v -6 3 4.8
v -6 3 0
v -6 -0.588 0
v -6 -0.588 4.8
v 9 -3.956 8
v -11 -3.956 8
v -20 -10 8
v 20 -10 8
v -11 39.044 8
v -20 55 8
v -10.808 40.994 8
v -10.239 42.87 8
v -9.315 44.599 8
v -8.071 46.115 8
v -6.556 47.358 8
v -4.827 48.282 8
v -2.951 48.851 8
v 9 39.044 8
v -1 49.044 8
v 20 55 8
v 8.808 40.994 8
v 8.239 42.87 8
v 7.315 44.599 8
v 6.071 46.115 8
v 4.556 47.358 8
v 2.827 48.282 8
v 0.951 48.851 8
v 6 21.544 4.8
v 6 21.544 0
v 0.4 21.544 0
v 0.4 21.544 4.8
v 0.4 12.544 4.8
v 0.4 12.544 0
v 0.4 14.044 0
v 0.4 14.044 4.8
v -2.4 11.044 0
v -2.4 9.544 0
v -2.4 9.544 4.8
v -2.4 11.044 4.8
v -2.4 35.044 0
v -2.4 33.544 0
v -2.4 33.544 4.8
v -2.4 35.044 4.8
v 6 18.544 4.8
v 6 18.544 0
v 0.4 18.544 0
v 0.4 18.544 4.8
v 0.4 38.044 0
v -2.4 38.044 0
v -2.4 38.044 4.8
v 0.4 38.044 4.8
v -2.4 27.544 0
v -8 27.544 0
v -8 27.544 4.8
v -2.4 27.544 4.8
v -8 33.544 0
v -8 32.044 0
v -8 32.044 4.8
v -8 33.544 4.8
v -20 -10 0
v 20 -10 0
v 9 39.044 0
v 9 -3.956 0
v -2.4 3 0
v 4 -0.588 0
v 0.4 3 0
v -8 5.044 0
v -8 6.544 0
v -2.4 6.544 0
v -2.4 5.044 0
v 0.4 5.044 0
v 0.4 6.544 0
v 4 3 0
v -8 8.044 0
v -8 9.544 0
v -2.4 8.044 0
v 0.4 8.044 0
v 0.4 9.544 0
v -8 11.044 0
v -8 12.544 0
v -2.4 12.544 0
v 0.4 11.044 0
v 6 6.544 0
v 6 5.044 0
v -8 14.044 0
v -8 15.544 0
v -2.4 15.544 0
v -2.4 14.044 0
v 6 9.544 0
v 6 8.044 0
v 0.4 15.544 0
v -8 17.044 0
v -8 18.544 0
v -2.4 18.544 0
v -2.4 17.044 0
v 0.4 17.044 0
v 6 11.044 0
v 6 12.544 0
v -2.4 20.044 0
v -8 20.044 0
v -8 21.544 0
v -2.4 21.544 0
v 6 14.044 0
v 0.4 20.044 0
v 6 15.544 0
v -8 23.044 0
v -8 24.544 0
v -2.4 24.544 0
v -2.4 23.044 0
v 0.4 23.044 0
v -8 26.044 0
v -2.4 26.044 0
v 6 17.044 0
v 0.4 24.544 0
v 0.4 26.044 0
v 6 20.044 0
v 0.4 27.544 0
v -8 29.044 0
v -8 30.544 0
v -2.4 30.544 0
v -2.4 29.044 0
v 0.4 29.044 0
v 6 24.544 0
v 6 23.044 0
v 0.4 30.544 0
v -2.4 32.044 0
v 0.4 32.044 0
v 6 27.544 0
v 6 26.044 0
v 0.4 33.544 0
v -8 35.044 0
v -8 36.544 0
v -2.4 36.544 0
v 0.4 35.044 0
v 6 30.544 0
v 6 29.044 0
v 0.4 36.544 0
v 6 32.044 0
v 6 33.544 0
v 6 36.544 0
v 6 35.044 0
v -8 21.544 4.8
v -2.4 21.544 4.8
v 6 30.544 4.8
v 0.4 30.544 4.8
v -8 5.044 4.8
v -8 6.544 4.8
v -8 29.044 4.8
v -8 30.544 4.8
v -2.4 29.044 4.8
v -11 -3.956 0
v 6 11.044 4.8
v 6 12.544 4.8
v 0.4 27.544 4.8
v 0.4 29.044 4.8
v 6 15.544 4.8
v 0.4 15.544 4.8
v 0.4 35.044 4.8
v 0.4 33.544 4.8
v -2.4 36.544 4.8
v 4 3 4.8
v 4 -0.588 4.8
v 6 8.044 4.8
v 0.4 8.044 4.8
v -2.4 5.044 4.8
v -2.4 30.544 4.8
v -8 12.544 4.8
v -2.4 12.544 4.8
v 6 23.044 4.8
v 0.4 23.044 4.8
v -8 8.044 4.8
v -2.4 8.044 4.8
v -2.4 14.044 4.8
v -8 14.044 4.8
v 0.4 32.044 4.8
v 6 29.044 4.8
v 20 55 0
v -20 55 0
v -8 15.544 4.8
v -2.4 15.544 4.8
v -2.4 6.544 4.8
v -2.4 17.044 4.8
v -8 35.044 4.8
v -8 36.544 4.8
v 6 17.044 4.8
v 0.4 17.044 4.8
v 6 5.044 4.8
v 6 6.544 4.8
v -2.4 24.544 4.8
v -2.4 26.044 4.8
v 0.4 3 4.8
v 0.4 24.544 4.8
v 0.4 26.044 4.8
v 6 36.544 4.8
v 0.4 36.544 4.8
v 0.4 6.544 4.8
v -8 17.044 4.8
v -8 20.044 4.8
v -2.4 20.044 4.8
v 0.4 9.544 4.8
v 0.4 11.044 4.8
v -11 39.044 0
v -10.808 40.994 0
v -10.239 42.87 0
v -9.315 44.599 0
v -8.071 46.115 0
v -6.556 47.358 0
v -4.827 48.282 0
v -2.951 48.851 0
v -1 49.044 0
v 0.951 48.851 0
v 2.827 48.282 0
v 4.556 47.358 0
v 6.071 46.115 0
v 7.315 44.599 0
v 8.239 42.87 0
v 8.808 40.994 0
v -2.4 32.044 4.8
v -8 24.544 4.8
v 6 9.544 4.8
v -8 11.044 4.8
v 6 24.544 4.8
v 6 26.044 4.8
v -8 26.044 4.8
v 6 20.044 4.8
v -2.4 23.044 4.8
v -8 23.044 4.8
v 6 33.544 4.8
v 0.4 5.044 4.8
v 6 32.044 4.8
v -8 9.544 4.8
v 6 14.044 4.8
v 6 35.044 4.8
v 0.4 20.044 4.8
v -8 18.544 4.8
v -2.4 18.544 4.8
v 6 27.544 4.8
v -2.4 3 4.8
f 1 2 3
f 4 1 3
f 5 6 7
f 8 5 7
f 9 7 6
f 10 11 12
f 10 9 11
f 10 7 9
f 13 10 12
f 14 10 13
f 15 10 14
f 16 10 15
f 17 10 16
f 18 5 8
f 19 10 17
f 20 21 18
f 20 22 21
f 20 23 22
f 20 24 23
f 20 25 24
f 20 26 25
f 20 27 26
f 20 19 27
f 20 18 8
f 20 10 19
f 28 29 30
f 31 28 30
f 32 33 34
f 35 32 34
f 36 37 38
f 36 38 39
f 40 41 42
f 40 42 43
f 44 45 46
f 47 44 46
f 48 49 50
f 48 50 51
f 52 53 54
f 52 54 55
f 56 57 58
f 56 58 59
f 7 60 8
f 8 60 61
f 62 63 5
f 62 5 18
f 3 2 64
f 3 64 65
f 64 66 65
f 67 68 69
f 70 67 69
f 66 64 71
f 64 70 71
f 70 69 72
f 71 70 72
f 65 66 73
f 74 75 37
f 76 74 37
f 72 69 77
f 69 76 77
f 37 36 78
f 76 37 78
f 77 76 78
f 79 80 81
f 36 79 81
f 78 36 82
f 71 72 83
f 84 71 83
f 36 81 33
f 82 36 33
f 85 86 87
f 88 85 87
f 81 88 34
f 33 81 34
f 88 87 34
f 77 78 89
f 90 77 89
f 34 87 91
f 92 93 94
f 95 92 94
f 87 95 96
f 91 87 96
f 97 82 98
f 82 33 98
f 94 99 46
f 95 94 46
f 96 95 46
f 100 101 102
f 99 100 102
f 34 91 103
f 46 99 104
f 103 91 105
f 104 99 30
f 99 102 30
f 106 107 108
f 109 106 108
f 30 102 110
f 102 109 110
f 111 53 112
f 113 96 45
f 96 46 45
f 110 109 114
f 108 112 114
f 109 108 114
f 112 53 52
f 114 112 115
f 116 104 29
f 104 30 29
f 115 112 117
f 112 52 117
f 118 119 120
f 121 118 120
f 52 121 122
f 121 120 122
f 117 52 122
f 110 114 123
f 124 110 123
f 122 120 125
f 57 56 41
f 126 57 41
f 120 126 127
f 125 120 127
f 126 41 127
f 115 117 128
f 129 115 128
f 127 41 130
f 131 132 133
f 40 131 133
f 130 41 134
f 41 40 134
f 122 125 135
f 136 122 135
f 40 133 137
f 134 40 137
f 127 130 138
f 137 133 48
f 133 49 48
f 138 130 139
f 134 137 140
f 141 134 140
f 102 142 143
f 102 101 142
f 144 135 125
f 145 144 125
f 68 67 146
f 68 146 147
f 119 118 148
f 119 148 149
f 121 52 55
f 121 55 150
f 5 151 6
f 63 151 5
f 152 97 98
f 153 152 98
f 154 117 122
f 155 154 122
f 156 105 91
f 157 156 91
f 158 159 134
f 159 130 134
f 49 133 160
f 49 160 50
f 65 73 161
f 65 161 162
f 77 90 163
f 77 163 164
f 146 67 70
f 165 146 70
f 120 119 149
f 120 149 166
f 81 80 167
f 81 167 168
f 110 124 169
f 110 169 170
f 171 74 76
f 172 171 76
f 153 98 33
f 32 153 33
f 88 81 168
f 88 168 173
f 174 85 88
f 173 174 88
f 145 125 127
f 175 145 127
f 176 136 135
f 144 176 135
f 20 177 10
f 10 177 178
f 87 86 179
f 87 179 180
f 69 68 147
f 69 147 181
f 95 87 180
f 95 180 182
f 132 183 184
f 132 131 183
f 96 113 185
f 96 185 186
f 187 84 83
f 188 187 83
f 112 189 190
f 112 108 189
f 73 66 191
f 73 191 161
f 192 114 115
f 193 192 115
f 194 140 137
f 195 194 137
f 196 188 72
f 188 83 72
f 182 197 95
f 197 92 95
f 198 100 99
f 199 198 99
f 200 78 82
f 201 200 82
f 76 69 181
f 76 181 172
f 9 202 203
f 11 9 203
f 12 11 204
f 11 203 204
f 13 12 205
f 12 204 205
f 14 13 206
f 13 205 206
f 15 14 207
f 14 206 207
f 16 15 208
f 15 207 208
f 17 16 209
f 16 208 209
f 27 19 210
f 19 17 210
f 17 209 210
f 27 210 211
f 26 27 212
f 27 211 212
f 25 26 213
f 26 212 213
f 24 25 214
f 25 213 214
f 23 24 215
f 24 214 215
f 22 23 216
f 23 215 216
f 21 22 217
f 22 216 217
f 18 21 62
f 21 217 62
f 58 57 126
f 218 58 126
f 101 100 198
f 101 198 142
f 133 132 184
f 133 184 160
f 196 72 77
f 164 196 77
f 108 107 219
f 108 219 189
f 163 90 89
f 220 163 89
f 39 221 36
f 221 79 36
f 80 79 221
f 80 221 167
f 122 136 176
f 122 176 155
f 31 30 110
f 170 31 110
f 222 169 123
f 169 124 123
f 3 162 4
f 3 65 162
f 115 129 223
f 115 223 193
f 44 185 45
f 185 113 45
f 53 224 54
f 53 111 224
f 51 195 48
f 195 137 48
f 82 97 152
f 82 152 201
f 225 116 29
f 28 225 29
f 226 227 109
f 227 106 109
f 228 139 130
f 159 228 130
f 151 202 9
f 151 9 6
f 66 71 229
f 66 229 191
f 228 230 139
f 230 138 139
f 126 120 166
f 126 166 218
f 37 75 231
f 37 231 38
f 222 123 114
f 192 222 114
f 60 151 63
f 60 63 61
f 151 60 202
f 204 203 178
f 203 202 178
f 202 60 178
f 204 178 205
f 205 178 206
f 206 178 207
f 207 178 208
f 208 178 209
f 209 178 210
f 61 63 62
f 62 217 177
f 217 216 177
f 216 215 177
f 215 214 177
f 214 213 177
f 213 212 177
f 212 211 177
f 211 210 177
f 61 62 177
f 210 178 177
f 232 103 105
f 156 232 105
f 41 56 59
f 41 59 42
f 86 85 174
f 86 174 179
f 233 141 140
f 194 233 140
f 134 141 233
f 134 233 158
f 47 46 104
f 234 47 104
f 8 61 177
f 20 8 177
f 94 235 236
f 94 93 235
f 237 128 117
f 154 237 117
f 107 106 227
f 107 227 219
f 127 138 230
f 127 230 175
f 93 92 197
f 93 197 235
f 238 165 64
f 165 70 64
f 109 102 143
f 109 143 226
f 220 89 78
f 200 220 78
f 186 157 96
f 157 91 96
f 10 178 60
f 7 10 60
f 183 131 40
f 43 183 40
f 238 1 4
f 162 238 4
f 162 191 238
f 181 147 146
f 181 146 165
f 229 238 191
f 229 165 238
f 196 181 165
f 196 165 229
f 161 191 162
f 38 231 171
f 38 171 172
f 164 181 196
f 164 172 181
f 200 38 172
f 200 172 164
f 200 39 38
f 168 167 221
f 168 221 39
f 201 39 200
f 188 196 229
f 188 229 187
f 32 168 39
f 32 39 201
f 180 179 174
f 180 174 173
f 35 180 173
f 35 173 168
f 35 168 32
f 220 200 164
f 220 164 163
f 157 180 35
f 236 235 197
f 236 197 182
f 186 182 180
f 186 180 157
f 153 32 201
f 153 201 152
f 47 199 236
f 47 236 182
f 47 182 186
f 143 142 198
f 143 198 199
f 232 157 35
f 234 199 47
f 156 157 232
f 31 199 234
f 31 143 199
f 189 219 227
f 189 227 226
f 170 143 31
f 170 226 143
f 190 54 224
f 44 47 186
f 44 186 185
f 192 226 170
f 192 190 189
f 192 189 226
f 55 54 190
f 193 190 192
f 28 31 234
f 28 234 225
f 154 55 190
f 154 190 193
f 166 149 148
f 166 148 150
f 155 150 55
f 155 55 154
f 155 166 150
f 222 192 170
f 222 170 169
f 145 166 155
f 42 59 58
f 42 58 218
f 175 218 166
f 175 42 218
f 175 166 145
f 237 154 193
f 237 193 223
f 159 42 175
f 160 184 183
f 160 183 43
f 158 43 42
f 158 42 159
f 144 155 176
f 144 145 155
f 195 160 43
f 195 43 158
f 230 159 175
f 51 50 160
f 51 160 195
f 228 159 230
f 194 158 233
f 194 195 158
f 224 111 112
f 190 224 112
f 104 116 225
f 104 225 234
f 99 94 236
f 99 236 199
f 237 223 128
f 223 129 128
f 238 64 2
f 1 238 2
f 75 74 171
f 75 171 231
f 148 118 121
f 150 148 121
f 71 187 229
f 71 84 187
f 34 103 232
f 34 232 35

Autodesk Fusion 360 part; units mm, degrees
sketch "Sketch1" plane through (0, 0, 0) normal (0, 0, 1) x (1, 0, 0)
  line L0 (-11, -3.9565) -> (9, -3.9565)
  line L1 (9, -3.9565) -> (9, 39.0435)
  line L2 (9, 39.0435) -> (-11, 39.0435)
  line L3 (-11, 39.0435) -> (-11, -3.9565)
  circle A0 centre (-1, 39.0435) radius 10
  line L4 (-1, -3.9565) -> (-1, 39.0435) construction
  line L5 (-8, 5.0435) -> (-8, 6.5435)
  line L6 (-8, 6.5435) -> (-2.4, 6.5435)
  line L7 (-2.4, 6.5435) -> (-2.4, 8.0435)
  line L8 (-8, 5.0435) -> (-2.4, 5.0435)
  line L9 (-8, 8.0435) -> (-2.4, 8.0435)
  line L10 (-8, 9.5435) -> (-2.4, 9.5435)
  line L11 (-8, 8.0435) -> (-8, 9.5435)
  line L12 (-2.4, 9.5435) -> (-2.4, 11.0435)
  line L13 (-8, 11.0435) -> (-2.4, 11.0435)
  line L14 (-8, 12.5435) -> (-2.4, 12.5435)
  line L15 (-8, 11.0435) -> (-8, 12.5435)
  line L16 (-2.4, 12.5435) -> (-2.4, 14.0435)
  line L17 (-8, 14.0435) -> (-2.4, 14.0435)
  line L18 (-8, 15.5435) -> (-2.4, 15.5435)
  line L19 (-8, 14.0435) -> (-8, 15.5435)
  line L20 (-2.4, 15.5435) -> (-2.4, 17.0435)
  line L21 (-8, 17.0435) -> (-2.4, 17.0435)
  line L22 (-8, 18.5435) -> (-2.4, 18.5435)
  line L23 (-8, 17.0435) -> (-8, 18.5435)
  line L24 (-2.4, 18.5435) -> (-2.4, 20.0435)
  line L25 (-8, 20.0435) -> (-2.4, 20.0435)
  line L26 (-8, 21.5435) -> (-2.4, 21.5435)
  line L27 (-8, 20.0435) -> (-8, 21.5435)
  line L28 (-2.4, 21.5435) -> (-2.4, 23.0435)
  line L29 (-8, 23.0435) -> (-2.4, 23.0435)
  line L30 (-8, 24.5435) -> (-2.4, 24.5435)
  line L31 (-8, 23.0435) -> (-8, 24.5435)
  line L32 (-2.4, 24.5435) -> (-2.4, 26.0435)
  line L33 (-8, 26.0435) -> (-2.4, 26.0435)
  line L34 (-8, 27.5435) -> (-2.4, 27.5435)
  line L35 (-8, 26.0435) -> (-8, 27.5435)
  line L36 (-2.4, 27.5435) -> (-2.4, 29.0435)
  line L37 (-8, 29.0435) -> (-2.4, 29.0435)
  line L38 (-8, 30.5435) -> (-2.4, 30.5435)
  line L39 (-8, 29.0435) -> (-8, 30.5435)
  line L40 (-2.4, 30.5435) -> (-2.4, 32.0435)
  line L41 (-8, 32.0435) -> (-2.4, 32.0435)
  line L42 (-8, 33.5435) -> (-2.4, 33.5435)
  line L43 (-8, 32.0435) -> (-8, 33.5435)
  line L44 (-2.4, 33.5435) -> (-2.4, 35.0435)
  line L45 (-8, 35.0435) -> (-2.4, 35.0435)
  line L46 (-8, 36.5435) -> (-2.4, 36.5435)
  line L47 (-8, 35.0435) -> (-8, 36.5435)
  line L48 (-2.4, 36.5435) -> (-2.4, 38.0435)
  line L49 (0.4, 36.5435) -> (0.4, 38.0435)
  line L50 (6, 29.0435) -> (6, 30.5435)
  line L51 (6, 30.5435) -> (0.4, 30.5435)
  line L52 (6, 29.0435) -> (0.4, 29.0435)
  line L53 (0.4, 27.5435) -> (0.4, 29.0435)
  line L54 (6, 26.0435) -> (6, 27.5435)
  line L55 (6, 27.5435) -> (0.4, 27.5435)
  line L56 (6, 26.0435) -> (0.4, 26.0435)
  line L57 (0.4, 24.5435) -> (0.4, 26.0435)
  line L58 (6, 23.0435) -> (6, 24.5435)
  line L59 (6, 24.5435) -> (0.4, 24.5435)
  line L60 (6, 23.0435) -> (0.4, 23.0435)
  line L61 (0.4, 21.5435) -> (0.4, 23.0435)
  line L62 (6, 20.0435) -> (6, 21.5435)
  line L63 (6, 21.5435) -> (0.4, 21.5435)
  line L64 (6, 20.0435) -> (0.4, 20.0435)
  line L65 (0.4, 18.5435) -> (0.4, 20.0435)
  line L66 (6, 17.0435) -> (6, 18.5435)
  line L67 (6, 18.5435) -> (0.4, 18.5435)
  line L68 (6, 17.0435) -> (0.4, 17.0435)
  line L69 (0.4, 15.5435) -> (0.4, 17.0435)
  line L70 (6, 15.5435) -> (0.4, 15.5435)
  line L71 (6, 14.0435) -> (6, 15.5435)
  line L72 (6, 14.0435) -> (0.4, 14.0435)
  line L73 (0.4, 12.5435) -> (0.4, 14.0435)
  line L74 (6, 11.0435) -> (6, 12.5435)
  line L75 (6, 12.5435) -> (0.4, 12.5435)
  line L76 (6, 11.0435) -> (0.4, 11.0435)
  line L77 (0.4, 9.5435) -> (0.4, 11.0435)
  line L78 (6, 8.0435) -> (6, 9.5435)
  line L79 (6, 9.5435) -> (0.4, 9.5435)
  line L80 (6, 8.0435) -> (0.4, 8.0435)
  line L81 (6, 5.0435) -> (0.4, 5.0435)
  line L82 (0.4, 6.5435) -> (0.4, 8.0435)
  line L83 (6, 6.5435) -> (0.4, 6.5435)
  line L84 (6, 5.0435) -> (6, 6.5435)
  line L85 (6, 33.5435) -> (0.4, 33.5435)
  line L86 (6, 32.0435) -> (6, 33.5435)
  line L87 (0.4, 33.5435) -> (0.4, 35.0435)
  line L88 (6, 35.0435) -> (0.4, 35.0435)
  line L89 (6, 36.5435) -> (0.4, 36.5435)
  line L90 (6, 35.0435) -> (6, 36.5435)
  line L91 (6, 32.0435) -> (0.4, 32.0435)
  line L92 (0.4, 30.5435) -> (0.4, 32.0435)
  line L93 (-2.4, 38.0435) -> (0.4, 38.0435)
  line L94 (-2.4, 5.0435) -> (-2.4, 3)
  line L95 (-2.4, 3) -> (-6, 3)
  line L96 (-6, 3) -> (-6, -0.5877)
  line L97 (-6, -0.5877) -> (-1, -0.5877)
  line L98 (0.4, 3) -> (4, 3)
  line L99 (0.4, 5.0435) -> (0.4, 3)
  line L100 (4, 3) -> (4, -0.5877)
  line L101 (4, -0.5877) -> (-1, -0.5877)
  line L102 (-20, -10) -> (20, -10)
  line L103 (20, -10) -> (20, 55)
  line L104 (20, 55) -> (-20, 55)
  line L105 (-20, 55) -> (-20, -10)
  dimension "d1" = 20
  dimension "d6" = 43
  dimension "d8" = 1.5
  dimension "d9" = 5.6
  dimension "d10" = 1.5
  dimension "d14" = 8.5
  dimension "d15" = 3
  dimension "d16" = 9
extrude "Extrude1" add sketch "Sketch1" along normal blind 8 makes body 1
extrude "Extrude2" add sketch "Sketch1" along normal blind 4.8 separate body contours A0 L38 L40 L41 L42 L43 L44 L45 L46 L47 L48 L49 L51 L85 L86 L87 L88 L89 L90 L91 L92 L93 | A0 L5 L6 L7 L8 L9 L10 L11 L12 L13 L14 L15 L16 L17 L18 L19 L20 L21 L22 L23 L24 L25 L26 L27 L28 L29 L30 L31 L32 L33 L34 L35 L36 L37 L38 L39 L50 L51 L52 L53 L54 L55 L56 L57 L58 L59 L60 L61 L62 L63 L64 L65 L66 L67 L68 L69 L70 L71 L72 L73 L74 L75 L76 L77 L78 L79 L80 L81 L82 L83 L84 L94 L95 L96 L97 L98 L99 L100 L101 makes body 2
equation "d1 = mold_width"
equation "mold_width = 20 mm"
equation "mold_length = 43 mm"
equation "comb_width = 7 mm"
equation "comb_tooth_width = 1.5 mm"
equation "d6 = mold_length"
equation "d8 = comb_tooth_width"
equation "d9 = comb_width * 0.8"
equation "d10 = comb_tooth_width"
equation "d16 = 6 * comb_tooth_width"
equation "mold_depth = 8 mm"
equation "d18 = mold_depth"
equation "d20 = 0.6 * mold_depth"
